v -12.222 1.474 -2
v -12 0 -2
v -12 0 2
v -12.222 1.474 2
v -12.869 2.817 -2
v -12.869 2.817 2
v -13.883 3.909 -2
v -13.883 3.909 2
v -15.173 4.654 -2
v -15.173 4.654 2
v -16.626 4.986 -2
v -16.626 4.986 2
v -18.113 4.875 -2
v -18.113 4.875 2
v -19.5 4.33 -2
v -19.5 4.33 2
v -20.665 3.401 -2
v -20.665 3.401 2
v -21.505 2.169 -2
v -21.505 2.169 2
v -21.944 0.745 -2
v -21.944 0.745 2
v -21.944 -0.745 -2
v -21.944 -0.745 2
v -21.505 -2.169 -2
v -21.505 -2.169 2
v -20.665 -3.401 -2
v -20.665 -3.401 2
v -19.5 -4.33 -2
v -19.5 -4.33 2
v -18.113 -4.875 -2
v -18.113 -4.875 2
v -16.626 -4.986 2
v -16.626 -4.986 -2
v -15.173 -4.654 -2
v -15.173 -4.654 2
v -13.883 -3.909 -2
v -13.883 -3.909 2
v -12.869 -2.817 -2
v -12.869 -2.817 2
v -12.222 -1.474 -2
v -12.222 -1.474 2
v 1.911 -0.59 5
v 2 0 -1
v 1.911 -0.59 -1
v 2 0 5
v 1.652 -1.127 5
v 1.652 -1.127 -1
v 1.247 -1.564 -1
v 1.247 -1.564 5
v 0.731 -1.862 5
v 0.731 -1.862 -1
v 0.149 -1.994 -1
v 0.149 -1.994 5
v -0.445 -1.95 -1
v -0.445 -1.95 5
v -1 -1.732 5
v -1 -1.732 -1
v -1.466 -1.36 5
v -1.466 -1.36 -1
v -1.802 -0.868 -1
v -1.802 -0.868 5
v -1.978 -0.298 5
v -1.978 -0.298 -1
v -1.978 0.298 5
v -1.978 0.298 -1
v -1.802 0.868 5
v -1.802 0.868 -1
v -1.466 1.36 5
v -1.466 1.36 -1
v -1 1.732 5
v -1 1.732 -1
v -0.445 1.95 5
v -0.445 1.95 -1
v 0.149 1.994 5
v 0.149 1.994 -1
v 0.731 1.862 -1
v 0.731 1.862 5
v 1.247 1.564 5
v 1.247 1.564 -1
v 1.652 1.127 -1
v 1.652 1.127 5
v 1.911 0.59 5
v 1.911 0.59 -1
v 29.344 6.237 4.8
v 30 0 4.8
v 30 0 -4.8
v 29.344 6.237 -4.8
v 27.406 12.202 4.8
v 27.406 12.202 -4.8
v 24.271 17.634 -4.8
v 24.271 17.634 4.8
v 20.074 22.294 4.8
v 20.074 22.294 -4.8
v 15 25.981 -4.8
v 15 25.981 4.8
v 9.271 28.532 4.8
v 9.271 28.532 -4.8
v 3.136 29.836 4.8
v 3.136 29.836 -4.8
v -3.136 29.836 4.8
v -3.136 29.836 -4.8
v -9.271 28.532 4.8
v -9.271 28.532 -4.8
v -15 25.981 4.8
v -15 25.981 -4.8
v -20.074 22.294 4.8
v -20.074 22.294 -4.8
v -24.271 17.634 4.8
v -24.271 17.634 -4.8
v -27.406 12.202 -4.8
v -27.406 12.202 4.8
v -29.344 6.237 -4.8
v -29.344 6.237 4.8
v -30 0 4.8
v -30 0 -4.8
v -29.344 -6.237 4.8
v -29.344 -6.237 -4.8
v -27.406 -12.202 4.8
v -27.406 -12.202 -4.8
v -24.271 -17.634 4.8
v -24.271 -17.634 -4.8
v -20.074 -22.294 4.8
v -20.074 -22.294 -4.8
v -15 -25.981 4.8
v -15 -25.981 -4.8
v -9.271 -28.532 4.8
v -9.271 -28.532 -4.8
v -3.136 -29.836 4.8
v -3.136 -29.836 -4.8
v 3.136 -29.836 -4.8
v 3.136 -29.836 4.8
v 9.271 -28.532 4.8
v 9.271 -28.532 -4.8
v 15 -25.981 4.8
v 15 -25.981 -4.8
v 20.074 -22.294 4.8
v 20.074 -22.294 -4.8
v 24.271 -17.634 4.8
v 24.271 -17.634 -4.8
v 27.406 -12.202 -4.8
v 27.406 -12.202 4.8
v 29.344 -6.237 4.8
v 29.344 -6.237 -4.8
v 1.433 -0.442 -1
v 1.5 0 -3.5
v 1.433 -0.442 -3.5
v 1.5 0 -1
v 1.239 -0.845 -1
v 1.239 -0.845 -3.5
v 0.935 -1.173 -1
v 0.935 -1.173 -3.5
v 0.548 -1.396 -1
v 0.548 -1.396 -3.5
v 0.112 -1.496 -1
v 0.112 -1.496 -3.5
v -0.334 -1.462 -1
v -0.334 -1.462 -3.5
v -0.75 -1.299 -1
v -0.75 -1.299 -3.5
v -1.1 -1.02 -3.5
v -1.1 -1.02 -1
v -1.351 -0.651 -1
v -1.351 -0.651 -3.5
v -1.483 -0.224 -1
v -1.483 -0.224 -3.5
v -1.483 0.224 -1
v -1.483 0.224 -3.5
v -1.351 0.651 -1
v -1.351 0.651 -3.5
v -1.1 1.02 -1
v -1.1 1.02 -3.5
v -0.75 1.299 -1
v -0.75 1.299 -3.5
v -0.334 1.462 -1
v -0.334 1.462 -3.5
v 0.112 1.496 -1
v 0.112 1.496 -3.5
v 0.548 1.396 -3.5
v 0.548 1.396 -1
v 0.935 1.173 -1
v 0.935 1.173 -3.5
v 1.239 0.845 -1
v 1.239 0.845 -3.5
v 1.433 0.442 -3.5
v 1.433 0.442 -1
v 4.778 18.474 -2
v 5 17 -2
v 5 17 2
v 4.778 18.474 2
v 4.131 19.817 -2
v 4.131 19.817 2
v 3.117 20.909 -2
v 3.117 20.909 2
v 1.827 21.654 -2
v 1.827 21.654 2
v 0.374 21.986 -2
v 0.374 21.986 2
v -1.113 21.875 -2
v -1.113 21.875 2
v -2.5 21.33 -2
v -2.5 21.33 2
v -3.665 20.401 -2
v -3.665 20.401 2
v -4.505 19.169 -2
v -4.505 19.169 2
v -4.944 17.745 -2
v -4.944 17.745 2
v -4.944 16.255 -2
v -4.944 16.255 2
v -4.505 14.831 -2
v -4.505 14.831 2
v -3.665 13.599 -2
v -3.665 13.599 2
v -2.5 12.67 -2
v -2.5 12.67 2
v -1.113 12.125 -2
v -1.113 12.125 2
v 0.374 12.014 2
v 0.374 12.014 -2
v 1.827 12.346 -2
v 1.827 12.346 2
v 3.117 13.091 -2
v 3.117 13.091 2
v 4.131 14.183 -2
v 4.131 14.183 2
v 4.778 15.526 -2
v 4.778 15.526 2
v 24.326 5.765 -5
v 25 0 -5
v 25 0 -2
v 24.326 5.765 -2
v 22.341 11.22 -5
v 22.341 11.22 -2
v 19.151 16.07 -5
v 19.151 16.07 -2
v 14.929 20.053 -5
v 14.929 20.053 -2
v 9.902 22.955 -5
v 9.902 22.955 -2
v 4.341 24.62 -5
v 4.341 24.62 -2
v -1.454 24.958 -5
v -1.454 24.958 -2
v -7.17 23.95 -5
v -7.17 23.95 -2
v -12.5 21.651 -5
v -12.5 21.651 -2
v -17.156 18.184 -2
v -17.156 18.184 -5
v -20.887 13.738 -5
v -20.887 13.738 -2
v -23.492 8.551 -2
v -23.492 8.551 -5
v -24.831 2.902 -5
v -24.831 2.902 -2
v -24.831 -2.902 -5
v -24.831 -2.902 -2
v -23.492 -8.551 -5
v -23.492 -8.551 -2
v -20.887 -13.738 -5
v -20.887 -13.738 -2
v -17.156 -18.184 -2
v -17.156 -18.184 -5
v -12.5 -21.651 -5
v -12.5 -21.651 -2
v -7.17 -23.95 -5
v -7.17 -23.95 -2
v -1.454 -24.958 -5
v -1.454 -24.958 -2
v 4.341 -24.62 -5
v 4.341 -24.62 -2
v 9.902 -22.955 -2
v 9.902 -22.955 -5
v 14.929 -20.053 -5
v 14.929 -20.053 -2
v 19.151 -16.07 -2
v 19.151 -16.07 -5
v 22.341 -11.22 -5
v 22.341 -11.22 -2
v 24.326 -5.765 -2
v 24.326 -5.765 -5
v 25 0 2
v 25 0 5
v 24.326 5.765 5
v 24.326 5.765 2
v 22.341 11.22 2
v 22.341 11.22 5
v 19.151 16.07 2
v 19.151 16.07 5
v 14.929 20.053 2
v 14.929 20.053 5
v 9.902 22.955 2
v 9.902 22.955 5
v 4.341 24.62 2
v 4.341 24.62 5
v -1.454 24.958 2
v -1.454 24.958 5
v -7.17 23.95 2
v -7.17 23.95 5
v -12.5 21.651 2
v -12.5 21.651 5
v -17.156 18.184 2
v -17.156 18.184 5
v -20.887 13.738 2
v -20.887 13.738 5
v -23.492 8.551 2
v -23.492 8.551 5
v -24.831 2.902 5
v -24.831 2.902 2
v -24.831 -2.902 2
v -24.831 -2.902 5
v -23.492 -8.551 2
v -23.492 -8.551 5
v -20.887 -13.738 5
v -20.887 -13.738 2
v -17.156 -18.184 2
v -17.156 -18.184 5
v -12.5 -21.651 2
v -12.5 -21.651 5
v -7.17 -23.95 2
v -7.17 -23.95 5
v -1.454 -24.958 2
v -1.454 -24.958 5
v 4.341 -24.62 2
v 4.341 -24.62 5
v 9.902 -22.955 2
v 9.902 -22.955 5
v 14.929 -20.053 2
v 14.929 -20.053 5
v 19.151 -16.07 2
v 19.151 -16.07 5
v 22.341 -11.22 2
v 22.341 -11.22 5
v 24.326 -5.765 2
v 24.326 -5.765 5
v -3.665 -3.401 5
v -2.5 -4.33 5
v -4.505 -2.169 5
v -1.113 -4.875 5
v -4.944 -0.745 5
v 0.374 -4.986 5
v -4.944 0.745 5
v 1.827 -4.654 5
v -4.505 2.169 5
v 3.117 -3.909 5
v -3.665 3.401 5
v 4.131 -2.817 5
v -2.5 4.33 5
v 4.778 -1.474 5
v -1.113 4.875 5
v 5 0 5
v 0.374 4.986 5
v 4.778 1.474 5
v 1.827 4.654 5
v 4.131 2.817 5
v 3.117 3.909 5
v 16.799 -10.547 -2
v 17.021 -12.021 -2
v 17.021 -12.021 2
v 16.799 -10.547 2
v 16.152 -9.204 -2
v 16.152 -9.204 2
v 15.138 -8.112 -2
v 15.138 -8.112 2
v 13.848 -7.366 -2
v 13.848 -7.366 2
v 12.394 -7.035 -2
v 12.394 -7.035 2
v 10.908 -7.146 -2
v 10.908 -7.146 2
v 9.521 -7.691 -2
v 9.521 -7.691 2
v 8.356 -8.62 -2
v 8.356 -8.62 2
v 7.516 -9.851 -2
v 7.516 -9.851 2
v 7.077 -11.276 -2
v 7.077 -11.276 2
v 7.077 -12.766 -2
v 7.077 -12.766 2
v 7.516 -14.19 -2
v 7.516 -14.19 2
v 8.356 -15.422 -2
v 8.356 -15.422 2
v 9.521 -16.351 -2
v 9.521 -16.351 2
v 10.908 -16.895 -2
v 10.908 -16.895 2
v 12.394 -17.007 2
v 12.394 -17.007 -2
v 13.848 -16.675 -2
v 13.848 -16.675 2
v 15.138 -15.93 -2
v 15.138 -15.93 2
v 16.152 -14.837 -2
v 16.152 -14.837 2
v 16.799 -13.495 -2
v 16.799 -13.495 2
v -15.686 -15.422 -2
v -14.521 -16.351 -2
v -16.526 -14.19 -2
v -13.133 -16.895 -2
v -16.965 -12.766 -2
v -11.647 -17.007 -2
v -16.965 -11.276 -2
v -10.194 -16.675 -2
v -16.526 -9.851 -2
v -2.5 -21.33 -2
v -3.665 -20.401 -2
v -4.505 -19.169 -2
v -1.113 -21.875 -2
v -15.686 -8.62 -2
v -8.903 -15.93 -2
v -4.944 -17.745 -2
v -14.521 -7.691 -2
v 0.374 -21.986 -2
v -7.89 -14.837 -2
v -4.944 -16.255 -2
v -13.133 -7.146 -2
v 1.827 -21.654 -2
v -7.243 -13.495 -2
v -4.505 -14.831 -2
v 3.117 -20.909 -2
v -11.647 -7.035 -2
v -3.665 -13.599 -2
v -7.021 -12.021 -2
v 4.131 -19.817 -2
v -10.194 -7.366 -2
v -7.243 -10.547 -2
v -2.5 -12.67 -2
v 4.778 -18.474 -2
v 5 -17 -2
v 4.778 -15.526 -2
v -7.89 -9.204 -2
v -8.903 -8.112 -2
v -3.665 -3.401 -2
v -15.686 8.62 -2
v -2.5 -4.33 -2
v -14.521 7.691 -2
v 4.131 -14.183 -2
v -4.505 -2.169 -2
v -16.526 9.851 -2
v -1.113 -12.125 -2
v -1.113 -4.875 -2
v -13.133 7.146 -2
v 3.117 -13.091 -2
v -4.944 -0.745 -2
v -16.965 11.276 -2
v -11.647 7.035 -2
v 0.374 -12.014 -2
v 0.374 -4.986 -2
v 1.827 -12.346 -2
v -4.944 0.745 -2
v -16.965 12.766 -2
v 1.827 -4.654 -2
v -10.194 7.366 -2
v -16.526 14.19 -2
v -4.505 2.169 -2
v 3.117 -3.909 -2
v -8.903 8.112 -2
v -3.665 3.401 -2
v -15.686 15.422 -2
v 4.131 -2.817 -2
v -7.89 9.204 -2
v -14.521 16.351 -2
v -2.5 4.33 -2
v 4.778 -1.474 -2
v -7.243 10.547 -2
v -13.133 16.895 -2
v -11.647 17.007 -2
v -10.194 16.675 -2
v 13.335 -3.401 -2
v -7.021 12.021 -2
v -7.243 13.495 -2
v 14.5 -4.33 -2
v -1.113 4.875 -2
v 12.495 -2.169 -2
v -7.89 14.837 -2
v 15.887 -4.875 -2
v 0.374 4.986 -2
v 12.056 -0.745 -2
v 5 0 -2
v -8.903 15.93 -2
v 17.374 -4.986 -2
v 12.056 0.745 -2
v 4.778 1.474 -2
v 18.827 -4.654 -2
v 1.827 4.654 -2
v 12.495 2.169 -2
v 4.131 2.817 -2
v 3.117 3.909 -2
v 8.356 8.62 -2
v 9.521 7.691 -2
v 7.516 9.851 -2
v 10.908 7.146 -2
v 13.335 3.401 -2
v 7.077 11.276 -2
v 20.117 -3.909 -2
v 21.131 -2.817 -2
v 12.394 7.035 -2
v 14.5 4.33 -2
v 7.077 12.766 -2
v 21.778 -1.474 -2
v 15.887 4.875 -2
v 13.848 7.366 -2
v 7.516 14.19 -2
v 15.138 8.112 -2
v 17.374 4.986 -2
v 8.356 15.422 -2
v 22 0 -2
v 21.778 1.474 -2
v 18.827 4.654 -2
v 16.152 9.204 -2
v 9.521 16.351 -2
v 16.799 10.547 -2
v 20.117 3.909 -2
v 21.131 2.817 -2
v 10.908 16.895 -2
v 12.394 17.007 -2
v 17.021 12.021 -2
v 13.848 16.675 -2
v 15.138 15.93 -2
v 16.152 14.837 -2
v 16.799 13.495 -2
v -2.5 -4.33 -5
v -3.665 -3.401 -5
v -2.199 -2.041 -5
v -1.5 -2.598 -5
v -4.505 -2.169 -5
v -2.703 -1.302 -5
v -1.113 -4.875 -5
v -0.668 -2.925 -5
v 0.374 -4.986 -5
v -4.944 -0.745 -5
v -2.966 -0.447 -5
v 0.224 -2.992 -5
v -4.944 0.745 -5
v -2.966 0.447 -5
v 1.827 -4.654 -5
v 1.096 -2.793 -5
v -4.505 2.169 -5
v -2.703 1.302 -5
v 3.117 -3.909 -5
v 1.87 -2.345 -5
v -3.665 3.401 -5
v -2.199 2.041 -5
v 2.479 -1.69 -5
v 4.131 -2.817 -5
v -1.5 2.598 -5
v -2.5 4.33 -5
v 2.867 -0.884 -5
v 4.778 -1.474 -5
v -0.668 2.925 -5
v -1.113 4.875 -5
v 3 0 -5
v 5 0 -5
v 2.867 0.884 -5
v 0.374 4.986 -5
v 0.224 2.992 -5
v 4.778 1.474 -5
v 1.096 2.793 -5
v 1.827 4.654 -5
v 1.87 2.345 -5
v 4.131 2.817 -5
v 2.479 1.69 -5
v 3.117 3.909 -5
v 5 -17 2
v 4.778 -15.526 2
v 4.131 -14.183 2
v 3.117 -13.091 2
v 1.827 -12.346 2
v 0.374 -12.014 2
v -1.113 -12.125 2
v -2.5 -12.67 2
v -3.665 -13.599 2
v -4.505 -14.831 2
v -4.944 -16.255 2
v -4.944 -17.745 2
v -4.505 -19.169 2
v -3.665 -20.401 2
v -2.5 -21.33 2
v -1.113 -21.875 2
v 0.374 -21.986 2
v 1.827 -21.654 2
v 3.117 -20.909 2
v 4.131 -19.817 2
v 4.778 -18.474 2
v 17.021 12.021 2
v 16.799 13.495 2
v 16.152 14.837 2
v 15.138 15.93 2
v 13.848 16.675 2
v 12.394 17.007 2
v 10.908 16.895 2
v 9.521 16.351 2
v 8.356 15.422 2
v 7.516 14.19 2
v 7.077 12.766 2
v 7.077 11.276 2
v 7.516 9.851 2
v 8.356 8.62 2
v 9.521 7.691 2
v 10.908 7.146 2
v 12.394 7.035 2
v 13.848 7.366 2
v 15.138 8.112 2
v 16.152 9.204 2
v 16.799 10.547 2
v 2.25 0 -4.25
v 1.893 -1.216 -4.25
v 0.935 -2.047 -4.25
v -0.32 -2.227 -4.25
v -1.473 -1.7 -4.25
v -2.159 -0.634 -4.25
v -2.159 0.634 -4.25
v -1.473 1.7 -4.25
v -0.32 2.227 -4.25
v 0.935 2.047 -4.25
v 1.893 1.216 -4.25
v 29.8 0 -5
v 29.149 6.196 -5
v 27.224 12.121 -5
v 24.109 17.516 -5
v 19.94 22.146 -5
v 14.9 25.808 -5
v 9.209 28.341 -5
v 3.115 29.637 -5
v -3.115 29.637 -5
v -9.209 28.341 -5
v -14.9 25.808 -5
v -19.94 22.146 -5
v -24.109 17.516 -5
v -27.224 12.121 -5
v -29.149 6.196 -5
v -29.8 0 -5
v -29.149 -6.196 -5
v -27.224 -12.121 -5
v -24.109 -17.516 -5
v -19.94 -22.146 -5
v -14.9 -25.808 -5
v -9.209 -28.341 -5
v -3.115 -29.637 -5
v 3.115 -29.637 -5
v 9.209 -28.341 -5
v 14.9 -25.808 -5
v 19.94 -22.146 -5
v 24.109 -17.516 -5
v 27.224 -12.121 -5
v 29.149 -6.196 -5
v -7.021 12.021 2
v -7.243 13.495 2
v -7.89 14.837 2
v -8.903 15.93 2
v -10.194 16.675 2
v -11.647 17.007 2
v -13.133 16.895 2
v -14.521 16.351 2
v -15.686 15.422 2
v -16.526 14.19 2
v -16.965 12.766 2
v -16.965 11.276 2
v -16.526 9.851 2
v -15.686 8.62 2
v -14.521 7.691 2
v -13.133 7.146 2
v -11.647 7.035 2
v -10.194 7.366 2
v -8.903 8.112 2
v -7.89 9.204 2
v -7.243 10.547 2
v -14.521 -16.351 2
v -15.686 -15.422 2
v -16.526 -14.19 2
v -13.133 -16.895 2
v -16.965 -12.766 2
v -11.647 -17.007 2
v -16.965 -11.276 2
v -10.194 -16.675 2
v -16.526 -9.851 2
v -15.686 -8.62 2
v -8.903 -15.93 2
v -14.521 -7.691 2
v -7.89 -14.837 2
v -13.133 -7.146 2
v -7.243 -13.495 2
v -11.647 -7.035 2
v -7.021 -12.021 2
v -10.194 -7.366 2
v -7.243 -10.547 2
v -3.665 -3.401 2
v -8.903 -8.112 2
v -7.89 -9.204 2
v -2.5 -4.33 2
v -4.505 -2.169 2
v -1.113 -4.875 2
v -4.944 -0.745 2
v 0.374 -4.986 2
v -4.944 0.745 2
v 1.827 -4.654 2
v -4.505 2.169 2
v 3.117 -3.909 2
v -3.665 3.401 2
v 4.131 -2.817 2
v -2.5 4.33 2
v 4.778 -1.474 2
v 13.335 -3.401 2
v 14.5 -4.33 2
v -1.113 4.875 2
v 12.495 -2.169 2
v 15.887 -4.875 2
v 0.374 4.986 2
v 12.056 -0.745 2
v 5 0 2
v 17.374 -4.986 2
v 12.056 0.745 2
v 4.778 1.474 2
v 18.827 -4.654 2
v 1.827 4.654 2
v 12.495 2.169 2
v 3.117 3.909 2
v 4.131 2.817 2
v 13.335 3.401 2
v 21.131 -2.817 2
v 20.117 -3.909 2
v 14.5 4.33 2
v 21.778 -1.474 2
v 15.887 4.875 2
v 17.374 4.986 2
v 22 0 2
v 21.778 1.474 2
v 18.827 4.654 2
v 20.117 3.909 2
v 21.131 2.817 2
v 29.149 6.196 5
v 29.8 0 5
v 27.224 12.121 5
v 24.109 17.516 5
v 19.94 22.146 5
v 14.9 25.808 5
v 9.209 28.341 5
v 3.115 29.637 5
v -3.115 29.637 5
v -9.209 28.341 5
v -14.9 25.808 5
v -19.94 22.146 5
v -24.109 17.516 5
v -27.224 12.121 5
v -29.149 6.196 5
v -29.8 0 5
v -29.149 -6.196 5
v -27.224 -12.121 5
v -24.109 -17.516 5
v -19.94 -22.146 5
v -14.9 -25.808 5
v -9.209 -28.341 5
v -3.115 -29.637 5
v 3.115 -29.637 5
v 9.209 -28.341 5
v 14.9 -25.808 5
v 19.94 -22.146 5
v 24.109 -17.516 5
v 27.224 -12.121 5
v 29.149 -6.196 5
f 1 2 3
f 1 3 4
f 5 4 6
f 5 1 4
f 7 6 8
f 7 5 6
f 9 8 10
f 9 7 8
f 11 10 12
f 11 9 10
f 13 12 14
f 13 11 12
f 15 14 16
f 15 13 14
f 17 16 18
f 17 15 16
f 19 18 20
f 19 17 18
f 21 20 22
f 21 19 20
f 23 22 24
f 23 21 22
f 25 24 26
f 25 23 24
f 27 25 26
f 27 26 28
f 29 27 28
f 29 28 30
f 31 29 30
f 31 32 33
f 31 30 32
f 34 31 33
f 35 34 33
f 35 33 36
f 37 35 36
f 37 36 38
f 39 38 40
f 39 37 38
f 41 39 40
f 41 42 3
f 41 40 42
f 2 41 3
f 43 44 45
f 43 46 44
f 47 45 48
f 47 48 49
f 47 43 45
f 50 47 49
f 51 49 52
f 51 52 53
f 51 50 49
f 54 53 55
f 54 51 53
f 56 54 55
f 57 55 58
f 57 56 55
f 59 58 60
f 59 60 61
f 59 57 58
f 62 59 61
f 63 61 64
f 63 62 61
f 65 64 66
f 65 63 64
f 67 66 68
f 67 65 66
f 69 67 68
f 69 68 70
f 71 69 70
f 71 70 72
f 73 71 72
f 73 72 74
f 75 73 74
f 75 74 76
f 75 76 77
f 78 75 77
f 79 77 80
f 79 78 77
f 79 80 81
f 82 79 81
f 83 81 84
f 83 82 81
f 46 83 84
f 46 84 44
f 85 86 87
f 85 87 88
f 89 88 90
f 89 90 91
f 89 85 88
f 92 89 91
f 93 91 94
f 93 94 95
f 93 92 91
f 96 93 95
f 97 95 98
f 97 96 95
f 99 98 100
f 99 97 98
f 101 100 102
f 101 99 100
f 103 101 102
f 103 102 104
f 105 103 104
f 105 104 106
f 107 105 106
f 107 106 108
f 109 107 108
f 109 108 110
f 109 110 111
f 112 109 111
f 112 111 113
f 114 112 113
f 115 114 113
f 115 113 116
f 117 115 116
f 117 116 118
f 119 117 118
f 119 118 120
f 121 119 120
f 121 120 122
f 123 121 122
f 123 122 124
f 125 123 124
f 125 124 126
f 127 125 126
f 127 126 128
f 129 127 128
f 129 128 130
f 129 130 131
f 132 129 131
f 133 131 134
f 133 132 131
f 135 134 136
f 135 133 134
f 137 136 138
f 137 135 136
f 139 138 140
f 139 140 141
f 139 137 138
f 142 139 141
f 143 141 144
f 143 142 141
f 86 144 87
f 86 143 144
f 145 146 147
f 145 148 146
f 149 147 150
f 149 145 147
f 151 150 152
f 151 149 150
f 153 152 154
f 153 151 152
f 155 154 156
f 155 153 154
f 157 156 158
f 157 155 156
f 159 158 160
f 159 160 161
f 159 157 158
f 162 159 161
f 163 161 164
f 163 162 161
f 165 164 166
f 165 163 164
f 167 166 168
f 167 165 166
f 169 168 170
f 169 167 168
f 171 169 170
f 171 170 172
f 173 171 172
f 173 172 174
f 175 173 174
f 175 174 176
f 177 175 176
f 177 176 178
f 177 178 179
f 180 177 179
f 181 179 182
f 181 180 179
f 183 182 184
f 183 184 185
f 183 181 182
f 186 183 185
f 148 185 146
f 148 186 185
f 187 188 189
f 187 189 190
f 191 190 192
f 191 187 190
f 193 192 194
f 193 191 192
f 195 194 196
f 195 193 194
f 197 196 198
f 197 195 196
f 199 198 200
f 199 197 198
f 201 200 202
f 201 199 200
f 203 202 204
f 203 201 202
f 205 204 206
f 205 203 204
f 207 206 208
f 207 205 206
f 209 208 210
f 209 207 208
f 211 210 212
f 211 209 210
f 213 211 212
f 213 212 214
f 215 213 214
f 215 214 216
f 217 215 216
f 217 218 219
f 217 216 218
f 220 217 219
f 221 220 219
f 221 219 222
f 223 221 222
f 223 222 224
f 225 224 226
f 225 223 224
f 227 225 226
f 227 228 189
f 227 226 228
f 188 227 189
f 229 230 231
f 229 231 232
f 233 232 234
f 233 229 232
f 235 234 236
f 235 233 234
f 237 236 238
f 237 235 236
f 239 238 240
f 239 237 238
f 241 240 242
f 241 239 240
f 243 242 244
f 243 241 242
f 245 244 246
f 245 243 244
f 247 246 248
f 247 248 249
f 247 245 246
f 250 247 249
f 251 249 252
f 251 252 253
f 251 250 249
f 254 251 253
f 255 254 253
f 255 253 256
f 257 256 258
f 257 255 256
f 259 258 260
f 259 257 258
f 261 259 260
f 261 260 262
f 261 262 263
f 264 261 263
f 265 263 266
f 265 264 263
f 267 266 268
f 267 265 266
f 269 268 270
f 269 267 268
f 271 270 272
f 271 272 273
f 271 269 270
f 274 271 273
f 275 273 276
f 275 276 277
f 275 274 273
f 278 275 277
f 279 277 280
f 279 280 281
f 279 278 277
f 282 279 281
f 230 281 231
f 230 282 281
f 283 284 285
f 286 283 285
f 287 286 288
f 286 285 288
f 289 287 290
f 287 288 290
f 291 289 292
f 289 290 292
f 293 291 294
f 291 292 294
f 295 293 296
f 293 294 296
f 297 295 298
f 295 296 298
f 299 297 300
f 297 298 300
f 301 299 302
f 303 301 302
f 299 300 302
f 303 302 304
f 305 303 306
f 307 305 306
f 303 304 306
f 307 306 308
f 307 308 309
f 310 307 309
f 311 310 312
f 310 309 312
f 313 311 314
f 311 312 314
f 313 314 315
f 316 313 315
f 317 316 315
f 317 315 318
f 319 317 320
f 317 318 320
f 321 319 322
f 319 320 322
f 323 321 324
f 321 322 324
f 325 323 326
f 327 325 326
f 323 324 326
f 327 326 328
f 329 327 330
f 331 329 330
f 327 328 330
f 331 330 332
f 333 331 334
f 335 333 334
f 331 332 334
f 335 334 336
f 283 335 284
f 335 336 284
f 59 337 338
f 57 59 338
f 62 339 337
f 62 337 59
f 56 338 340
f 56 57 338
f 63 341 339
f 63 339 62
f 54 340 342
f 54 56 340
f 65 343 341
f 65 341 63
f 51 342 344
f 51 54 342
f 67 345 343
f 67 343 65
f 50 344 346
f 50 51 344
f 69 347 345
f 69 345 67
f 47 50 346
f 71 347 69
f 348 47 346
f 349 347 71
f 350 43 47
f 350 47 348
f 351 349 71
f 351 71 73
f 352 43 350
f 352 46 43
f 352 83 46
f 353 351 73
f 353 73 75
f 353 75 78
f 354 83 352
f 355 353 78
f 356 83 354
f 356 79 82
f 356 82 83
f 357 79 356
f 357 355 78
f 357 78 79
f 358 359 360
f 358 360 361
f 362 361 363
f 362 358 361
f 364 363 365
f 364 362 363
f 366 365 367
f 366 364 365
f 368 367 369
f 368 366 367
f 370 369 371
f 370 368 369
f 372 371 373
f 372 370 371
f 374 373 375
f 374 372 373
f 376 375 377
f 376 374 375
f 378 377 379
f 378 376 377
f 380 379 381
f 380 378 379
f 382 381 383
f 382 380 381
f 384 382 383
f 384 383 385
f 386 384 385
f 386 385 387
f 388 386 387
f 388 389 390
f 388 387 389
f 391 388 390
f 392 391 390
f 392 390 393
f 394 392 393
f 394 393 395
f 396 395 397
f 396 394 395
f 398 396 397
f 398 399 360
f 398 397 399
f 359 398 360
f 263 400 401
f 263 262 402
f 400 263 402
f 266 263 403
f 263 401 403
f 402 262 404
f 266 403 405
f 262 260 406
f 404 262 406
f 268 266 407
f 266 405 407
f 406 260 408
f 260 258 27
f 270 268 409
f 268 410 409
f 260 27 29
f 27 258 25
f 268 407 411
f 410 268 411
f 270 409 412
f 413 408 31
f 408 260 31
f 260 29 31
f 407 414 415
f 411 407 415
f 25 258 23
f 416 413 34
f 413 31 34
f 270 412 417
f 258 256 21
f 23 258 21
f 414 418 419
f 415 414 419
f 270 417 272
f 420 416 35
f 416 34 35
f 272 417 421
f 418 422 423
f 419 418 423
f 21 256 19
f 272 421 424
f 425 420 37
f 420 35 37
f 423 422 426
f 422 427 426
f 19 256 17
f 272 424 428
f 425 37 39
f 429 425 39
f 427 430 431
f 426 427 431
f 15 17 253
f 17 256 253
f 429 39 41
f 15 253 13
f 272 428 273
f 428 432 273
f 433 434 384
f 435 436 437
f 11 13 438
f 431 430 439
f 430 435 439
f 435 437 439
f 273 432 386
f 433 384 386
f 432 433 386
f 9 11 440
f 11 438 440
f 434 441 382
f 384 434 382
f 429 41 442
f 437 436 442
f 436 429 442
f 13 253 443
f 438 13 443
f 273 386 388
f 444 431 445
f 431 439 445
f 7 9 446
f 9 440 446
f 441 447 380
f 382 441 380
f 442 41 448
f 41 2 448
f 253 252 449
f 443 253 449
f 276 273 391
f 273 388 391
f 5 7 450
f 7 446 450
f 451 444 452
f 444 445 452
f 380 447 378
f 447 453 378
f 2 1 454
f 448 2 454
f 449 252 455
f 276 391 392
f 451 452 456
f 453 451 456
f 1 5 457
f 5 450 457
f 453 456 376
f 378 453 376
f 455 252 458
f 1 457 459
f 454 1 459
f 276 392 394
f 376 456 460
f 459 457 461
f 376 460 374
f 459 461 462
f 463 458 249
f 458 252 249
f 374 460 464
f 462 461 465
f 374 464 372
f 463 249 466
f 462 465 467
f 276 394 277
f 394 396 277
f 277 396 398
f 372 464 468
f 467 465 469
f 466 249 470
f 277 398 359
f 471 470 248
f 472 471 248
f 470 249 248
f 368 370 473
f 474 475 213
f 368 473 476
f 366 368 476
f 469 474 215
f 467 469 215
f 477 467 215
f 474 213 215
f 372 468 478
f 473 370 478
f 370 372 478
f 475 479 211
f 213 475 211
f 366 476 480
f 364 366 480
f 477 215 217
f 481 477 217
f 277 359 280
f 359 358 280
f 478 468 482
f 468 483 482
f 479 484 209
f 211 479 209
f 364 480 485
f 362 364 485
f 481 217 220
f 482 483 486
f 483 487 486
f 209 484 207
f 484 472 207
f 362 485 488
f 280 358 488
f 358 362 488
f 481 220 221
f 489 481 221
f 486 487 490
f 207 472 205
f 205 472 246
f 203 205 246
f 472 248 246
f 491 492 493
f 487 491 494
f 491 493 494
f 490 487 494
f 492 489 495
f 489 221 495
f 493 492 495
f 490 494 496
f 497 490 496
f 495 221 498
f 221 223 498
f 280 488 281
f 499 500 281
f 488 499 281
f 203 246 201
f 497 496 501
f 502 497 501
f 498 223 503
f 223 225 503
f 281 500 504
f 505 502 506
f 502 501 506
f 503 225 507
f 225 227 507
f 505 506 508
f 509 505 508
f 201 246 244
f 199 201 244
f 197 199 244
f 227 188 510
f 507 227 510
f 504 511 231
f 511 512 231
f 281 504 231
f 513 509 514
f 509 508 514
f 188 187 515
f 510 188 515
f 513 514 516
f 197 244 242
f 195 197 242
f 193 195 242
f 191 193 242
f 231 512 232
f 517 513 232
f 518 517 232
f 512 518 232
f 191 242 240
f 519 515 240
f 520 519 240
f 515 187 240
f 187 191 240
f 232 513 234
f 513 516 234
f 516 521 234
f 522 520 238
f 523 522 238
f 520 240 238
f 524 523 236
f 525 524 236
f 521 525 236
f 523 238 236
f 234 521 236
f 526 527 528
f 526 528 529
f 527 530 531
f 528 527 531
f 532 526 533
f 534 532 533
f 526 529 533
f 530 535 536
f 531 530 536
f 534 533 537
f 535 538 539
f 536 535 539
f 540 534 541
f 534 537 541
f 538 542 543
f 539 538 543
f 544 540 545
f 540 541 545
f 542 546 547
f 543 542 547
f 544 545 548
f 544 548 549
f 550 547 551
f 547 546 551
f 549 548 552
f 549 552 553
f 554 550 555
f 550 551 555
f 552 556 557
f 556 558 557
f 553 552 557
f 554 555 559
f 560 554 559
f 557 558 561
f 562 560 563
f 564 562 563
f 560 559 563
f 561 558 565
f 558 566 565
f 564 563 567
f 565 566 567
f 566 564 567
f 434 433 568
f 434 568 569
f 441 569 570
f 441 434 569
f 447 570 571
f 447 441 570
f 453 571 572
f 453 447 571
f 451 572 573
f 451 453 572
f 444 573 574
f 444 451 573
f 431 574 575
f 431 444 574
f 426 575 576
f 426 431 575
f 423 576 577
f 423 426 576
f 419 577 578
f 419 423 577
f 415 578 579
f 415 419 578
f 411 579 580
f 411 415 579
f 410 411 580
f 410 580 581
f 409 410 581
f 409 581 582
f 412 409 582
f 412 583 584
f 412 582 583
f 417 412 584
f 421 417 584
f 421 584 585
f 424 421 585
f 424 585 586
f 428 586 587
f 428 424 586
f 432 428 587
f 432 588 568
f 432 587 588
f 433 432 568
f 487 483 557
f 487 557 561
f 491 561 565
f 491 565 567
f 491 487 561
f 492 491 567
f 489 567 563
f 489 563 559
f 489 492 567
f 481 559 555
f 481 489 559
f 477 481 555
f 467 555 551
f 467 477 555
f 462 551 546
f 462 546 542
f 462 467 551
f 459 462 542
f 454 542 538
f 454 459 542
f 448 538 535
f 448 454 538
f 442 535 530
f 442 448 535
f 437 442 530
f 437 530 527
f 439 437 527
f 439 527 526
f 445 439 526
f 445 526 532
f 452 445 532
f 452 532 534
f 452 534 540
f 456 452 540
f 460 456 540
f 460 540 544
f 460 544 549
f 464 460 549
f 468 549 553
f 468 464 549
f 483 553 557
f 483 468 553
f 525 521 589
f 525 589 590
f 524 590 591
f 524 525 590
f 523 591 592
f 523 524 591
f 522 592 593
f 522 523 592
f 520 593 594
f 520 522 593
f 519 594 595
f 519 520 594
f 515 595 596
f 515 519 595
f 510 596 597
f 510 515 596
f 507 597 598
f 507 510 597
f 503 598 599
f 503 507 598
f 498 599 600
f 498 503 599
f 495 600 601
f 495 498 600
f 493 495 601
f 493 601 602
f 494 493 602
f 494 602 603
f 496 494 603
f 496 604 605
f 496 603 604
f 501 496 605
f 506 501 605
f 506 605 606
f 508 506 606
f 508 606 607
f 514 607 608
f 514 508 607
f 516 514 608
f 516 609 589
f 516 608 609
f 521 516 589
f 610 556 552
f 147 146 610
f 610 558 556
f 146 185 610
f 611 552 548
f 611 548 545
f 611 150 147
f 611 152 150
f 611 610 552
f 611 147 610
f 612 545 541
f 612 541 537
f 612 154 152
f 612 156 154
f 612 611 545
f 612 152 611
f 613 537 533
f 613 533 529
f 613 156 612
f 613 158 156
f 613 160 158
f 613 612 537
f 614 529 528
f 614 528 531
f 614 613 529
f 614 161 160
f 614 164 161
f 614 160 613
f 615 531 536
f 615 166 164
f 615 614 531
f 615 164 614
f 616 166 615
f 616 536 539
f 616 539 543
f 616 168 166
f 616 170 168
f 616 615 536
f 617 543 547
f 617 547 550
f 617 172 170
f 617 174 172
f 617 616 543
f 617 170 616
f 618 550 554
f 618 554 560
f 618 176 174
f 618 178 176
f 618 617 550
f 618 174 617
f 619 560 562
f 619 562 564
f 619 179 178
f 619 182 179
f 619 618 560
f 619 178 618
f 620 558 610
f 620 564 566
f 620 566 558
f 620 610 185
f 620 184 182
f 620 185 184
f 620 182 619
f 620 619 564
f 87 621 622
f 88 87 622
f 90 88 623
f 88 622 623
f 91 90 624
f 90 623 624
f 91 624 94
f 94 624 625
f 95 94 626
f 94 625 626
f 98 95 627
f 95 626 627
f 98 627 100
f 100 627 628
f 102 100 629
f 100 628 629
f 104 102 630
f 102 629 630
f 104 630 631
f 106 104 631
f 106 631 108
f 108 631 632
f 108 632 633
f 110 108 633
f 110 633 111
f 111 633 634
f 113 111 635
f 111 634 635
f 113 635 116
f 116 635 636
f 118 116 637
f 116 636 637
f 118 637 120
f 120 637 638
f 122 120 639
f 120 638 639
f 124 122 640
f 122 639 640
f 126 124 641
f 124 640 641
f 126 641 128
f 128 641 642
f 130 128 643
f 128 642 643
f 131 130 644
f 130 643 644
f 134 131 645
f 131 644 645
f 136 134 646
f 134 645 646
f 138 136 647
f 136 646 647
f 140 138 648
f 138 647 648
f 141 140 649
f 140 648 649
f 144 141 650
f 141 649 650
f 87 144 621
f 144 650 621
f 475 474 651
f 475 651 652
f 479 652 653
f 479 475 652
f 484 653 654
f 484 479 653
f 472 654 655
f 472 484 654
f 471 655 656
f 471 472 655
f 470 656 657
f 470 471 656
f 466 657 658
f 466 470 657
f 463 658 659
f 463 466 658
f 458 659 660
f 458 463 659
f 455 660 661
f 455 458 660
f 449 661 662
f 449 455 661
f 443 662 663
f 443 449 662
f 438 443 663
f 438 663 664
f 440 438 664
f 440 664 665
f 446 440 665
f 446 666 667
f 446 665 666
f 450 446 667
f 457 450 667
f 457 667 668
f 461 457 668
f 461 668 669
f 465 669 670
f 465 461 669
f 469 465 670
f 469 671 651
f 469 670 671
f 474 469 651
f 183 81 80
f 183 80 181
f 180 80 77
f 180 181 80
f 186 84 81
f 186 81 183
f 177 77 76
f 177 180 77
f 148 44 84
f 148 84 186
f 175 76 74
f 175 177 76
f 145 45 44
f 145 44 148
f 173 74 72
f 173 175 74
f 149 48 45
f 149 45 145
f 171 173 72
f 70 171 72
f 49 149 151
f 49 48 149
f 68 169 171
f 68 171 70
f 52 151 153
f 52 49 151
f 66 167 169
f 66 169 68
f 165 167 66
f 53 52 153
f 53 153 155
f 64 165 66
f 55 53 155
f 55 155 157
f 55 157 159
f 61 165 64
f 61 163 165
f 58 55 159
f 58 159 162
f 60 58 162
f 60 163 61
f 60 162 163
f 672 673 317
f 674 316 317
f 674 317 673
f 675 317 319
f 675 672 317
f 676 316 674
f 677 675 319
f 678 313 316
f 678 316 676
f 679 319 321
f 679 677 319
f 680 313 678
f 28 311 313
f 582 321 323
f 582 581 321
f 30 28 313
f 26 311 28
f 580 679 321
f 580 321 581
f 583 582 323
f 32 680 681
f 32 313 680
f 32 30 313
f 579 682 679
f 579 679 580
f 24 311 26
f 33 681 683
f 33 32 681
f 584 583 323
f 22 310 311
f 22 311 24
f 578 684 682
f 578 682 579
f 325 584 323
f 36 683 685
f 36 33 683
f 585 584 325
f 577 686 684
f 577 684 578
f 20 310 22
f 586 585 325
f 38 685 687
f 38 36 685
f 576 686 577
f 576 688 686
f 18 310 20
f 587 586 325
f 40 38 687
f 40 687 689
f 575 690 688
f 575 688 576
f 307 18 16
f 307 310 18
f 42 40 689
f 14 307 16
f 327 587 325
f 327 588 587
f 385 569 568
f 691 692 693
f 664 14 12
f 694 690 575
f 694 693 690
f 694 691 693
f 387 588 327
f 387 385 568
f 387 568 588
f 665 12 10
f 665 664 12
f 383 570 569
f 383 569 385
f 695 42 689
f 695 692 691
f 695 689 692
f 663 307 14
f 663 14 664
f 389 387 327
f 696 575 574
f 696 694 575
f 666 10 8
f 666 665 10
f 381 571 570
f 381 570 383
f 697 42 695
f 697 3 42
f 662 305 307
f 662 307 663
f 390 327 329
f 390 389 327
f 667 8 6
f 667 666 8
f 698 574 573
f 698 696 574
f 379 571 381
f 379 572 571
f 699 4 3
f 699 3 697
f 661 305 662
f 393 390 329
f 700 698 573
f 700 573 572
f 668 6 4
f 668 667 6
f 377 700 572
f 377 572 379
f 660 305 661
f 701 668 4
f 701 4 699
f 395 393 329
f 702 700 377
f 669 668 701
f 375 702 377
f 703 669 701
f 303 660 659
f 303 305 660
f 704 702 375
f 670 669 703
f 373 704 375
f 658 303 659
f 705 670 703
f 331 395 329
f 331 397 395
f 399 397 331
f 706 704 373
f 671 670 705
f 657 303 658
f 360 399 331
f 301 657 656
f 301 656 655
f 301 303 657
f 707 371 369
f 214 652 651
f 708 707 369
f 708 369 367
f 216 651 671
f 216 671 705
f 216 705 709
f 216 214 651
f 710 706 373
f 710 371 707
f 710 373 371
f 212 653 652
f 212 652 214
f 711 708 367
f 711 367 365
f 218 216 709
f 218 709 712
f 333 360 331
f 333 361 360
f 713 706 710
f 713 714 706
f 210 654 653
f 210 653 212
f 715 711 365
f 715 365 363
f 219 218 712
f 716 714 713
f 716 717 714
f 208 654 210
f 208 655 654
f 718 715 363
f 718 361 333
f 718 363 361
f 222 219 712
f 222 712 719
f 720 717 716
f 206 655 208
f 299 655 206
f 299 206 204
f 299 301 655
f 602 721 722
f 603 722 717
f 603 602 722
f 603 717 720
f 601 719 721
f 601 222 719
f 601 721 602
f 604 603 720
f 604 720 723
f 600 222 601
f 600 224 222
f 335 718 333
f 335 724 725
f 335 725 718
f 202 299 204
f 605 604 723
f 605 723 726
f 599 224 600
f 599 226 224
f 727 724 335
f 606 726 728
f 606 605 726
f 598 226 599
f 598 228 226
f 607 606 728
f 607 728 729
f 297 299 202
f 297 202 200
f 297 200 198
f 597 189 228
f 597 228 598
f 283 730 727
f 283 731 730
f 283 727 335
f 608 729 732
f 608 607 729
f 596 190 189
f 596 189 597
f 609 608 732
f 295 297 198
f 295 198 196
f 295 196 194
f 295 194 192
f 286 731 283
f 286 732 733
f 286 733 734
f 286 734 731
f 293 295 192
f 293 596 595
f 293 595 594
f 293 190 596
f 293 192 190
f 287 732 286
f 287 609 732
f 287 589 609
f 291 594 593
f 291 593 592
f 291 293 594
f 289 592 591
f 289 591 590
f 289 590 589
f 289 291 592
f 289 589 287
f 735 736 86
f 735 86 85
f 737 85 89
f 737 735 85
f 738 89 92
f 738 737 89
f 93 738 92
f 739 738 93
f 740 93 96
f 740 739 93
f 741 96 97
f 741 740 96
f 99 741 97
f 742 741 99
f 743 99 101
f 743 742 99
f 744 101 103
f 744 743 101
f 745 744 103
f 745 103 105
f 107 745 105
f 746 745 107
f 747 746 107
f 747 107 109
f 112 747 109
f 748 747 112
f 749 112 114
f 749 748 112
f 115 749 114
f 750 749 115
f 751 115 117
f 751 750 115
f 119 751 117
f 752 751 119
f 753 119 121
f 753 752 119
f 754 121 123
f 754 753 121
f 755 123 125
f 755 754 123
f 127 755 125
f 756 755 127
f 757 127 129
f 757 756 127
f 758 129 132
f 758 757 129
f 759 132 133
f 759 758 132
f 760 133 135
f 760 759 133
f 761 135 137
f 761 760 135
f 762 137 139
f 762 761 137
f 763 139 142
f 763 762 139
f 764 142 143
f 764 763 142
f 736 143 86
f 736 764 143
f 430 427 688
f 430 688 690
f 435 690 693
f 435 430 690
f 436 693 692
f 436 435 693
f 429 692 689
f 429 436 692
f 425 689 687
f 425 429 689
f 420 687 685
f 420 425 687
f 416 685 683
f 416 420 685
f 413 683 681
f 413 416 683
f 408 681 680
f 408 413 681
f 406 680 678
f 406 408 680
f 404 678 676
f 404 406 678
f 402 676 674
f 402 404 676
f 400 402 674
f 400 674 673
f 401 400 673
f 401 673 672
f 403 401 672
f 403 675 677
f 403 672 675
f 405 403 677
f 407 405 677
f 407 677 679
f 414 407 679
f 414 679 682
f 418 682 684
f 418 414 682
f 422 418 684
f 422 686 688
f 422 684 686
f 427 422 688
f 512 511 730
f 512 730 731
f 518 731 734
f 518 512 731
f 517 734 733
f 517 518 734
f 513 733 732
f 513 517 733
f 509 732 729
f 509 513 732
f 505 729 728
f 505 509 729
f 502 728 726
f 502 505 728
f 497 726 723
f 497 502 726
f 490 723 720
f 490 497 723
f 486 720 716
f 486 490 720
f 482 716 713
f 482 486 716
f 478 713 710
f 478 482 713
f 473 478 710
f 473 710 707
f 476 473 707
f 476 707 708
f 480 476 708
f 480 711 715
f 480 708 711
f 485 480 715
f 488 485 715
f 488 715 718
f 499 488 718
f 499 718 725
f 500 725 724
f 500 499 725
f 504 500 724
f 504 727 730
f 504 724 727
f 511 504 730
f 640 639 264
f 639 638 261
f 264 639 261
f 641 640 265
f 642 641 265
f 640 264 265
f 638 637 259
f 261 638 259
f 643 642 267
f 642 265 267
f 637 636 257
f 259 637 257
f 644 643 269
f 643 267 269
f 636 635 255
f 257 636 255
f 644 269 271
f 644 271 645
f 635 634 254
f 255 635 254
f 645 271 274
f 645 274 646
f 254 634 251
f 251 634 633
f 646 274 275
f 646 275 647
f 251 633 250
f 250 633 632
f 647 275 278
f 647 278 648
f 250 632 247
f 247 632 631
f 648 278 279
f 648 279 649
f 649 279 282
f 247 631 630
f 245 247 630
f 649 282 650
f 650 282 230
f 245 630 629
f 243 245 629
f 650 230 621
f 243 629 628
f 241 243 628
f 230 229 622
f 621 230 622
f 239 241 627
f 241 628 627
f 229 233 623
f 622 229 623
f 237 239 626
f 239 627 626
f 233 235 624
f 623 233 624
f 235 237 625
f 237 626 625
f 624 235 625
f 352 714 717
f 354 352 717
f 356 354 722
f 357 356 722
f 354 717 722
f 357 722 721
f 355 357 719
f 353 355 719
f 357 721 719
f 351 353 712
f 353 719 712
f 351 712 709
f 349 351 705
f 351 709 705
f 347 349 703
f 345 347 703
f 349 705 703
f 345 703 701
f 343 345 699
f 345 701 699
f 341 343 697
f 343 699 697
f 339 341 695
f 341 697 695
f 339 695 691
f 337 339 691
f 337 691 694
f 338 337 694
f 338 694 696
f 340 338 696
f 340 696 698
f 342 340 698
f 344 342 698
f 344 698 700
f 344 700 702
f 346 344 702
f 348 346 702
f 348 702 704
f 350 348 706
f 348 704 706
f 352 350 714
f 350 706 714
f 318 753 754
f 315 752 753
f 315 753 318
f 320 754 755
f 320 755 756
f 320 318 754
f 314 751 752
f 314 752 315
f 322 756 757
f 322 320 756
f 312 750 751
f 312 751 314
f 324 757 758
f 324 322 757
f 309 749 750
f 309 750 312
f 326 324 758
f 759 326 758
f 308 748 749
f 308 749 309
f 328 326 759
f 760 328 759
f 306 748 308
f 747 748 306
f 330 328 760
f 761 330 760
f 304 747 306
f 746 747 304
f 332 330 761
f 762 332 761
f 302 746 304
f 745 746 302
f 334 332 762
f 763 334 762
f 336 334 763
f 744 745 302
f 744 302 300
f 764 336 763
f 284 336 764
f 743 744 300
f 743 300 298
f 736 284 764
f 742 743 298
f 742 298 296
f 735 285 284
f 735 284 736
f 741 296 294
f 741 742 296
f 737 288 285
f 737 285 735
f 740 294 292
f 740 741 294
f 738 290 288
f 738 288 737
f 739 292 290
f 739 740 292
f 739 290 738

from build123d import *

# Parameters (mm, degrees)
SKETCH1_R               = 30
BOSS_EXTRUDE1_DEPTH     = 5
SKETCH2_R               = 25
CUT_EXTRUDE1_DEPTH      = 3
CUT_EXTRUDE2_DEPTH      = 44
CUT_EXTRUDE2_DEPTH_BACK = 44
SKETCH3_R               = 5
SKETCH4_R               = 5
BOSS_EXTRUDE2_DEPTH     = 3
CHAMFER1_SIZE           = 0.2


with BuildPart() as part:
    # Sketch1 → Boss-Extrude1 (new, symmetric)
    with BuildSketch(Plane.XY):
        Circle(SKETCH1_R)
    extrude(amount=BOSS_EXTRUDE1_DEPTH, both=True)

    # Sketch2 → Cut-Extrude1 (cut)
    with BuildSketch(Plane.XY.offset(5)):
        Circle(SKETCH2_R)
    cut_extrude1 = extrude(amount=-CUT_EXTRUDE1_DEPTH, mode=Mode.SUBTRACT)

    # Mirror1: Cut-Extrude1 across plane
    add(cut_extrude1.mirror(Plane.XY), mode=Mode.SUBTRACT)

    # Sketch3 → Cut-Extrude2 (cut, two sides: drawn at the far end of the back side and taken through both)
    with BuildSketch(Plane.XY.offset(2).offset(-CUT_EXTRUDE2_DEPTH_BACK)):
        with Locations((0, 17)):
            Circle(SKETCH3_R)
        with Locations((12.02081528, 12.02081528)):
            Circle(SKETCH3_R)
        with Locations((17, 0)):
            Circle(SKETCH3_R)
        with Locations((12.02081528, -12.02081528)):
            Circle(SKETCH3_R)
        with Locations((0, -17)):
            Circle(SKETCH3_R)
        with Locations((-12.02081528, -12.02081528)):
            Circle(SKETCH3_R)
        with Locations((-17, 0)):
            Circle(SKETCH3_R)
        with Locations((-12.02081528, 12.02081528)):
            Circle(SKETCH3_R)
    extrude(amount=CUT_EXTRUDE2_DEPTH + CUT_EXTRUDE2_DEPTH_BACK, mode=Mode.SUBTRACT)

    # Sketch4 → Boss-Extrude2 (add)
    with BuildSketch(Plane.XY.offset(2)):
        Circle(SKETCH4_R)
    boss_extrude2 = extrude(amount=BOSS_EXTRUDE2_DEPTH)

    # Mirror2: Boss-Extrude2 across plane
    add(boss_extrude2.mirror(Plane.XY))

    # Sketch5 → Cut-Revolve1 (revolve, cut)
    with BuildSketch(Plane(origin=(0, 0, 0), x_dir=(0, 0, -1), z_dir=(1, 0, 0)), mode=Mode.PRIVATE) as cut_revolve1_sk:
        Polygon((-5, 0), (5, 0), (5, 3), (3.5, 1.5), (1, 1.5), (1, 2), (-5, 2), align=None)
    revolve(cut_revolve1_sk.sketch.rotate(Axis((0, 0, 5), (0, 0, -1)), 90), axis=Axis((0, 0, 5), (0, 0, -1)), mode=Mode.SUBTRACT)

    # Chamfer1
    chamfer1_edges = [part.edges().sort_by_distance(p)[0] for p in [
        (-30, 0, -5),
        (-30, 0, 5),
    ]]
    chamfer(chamfer1_edges, length=CHAMFER1_SIZE)


solid = part.part
